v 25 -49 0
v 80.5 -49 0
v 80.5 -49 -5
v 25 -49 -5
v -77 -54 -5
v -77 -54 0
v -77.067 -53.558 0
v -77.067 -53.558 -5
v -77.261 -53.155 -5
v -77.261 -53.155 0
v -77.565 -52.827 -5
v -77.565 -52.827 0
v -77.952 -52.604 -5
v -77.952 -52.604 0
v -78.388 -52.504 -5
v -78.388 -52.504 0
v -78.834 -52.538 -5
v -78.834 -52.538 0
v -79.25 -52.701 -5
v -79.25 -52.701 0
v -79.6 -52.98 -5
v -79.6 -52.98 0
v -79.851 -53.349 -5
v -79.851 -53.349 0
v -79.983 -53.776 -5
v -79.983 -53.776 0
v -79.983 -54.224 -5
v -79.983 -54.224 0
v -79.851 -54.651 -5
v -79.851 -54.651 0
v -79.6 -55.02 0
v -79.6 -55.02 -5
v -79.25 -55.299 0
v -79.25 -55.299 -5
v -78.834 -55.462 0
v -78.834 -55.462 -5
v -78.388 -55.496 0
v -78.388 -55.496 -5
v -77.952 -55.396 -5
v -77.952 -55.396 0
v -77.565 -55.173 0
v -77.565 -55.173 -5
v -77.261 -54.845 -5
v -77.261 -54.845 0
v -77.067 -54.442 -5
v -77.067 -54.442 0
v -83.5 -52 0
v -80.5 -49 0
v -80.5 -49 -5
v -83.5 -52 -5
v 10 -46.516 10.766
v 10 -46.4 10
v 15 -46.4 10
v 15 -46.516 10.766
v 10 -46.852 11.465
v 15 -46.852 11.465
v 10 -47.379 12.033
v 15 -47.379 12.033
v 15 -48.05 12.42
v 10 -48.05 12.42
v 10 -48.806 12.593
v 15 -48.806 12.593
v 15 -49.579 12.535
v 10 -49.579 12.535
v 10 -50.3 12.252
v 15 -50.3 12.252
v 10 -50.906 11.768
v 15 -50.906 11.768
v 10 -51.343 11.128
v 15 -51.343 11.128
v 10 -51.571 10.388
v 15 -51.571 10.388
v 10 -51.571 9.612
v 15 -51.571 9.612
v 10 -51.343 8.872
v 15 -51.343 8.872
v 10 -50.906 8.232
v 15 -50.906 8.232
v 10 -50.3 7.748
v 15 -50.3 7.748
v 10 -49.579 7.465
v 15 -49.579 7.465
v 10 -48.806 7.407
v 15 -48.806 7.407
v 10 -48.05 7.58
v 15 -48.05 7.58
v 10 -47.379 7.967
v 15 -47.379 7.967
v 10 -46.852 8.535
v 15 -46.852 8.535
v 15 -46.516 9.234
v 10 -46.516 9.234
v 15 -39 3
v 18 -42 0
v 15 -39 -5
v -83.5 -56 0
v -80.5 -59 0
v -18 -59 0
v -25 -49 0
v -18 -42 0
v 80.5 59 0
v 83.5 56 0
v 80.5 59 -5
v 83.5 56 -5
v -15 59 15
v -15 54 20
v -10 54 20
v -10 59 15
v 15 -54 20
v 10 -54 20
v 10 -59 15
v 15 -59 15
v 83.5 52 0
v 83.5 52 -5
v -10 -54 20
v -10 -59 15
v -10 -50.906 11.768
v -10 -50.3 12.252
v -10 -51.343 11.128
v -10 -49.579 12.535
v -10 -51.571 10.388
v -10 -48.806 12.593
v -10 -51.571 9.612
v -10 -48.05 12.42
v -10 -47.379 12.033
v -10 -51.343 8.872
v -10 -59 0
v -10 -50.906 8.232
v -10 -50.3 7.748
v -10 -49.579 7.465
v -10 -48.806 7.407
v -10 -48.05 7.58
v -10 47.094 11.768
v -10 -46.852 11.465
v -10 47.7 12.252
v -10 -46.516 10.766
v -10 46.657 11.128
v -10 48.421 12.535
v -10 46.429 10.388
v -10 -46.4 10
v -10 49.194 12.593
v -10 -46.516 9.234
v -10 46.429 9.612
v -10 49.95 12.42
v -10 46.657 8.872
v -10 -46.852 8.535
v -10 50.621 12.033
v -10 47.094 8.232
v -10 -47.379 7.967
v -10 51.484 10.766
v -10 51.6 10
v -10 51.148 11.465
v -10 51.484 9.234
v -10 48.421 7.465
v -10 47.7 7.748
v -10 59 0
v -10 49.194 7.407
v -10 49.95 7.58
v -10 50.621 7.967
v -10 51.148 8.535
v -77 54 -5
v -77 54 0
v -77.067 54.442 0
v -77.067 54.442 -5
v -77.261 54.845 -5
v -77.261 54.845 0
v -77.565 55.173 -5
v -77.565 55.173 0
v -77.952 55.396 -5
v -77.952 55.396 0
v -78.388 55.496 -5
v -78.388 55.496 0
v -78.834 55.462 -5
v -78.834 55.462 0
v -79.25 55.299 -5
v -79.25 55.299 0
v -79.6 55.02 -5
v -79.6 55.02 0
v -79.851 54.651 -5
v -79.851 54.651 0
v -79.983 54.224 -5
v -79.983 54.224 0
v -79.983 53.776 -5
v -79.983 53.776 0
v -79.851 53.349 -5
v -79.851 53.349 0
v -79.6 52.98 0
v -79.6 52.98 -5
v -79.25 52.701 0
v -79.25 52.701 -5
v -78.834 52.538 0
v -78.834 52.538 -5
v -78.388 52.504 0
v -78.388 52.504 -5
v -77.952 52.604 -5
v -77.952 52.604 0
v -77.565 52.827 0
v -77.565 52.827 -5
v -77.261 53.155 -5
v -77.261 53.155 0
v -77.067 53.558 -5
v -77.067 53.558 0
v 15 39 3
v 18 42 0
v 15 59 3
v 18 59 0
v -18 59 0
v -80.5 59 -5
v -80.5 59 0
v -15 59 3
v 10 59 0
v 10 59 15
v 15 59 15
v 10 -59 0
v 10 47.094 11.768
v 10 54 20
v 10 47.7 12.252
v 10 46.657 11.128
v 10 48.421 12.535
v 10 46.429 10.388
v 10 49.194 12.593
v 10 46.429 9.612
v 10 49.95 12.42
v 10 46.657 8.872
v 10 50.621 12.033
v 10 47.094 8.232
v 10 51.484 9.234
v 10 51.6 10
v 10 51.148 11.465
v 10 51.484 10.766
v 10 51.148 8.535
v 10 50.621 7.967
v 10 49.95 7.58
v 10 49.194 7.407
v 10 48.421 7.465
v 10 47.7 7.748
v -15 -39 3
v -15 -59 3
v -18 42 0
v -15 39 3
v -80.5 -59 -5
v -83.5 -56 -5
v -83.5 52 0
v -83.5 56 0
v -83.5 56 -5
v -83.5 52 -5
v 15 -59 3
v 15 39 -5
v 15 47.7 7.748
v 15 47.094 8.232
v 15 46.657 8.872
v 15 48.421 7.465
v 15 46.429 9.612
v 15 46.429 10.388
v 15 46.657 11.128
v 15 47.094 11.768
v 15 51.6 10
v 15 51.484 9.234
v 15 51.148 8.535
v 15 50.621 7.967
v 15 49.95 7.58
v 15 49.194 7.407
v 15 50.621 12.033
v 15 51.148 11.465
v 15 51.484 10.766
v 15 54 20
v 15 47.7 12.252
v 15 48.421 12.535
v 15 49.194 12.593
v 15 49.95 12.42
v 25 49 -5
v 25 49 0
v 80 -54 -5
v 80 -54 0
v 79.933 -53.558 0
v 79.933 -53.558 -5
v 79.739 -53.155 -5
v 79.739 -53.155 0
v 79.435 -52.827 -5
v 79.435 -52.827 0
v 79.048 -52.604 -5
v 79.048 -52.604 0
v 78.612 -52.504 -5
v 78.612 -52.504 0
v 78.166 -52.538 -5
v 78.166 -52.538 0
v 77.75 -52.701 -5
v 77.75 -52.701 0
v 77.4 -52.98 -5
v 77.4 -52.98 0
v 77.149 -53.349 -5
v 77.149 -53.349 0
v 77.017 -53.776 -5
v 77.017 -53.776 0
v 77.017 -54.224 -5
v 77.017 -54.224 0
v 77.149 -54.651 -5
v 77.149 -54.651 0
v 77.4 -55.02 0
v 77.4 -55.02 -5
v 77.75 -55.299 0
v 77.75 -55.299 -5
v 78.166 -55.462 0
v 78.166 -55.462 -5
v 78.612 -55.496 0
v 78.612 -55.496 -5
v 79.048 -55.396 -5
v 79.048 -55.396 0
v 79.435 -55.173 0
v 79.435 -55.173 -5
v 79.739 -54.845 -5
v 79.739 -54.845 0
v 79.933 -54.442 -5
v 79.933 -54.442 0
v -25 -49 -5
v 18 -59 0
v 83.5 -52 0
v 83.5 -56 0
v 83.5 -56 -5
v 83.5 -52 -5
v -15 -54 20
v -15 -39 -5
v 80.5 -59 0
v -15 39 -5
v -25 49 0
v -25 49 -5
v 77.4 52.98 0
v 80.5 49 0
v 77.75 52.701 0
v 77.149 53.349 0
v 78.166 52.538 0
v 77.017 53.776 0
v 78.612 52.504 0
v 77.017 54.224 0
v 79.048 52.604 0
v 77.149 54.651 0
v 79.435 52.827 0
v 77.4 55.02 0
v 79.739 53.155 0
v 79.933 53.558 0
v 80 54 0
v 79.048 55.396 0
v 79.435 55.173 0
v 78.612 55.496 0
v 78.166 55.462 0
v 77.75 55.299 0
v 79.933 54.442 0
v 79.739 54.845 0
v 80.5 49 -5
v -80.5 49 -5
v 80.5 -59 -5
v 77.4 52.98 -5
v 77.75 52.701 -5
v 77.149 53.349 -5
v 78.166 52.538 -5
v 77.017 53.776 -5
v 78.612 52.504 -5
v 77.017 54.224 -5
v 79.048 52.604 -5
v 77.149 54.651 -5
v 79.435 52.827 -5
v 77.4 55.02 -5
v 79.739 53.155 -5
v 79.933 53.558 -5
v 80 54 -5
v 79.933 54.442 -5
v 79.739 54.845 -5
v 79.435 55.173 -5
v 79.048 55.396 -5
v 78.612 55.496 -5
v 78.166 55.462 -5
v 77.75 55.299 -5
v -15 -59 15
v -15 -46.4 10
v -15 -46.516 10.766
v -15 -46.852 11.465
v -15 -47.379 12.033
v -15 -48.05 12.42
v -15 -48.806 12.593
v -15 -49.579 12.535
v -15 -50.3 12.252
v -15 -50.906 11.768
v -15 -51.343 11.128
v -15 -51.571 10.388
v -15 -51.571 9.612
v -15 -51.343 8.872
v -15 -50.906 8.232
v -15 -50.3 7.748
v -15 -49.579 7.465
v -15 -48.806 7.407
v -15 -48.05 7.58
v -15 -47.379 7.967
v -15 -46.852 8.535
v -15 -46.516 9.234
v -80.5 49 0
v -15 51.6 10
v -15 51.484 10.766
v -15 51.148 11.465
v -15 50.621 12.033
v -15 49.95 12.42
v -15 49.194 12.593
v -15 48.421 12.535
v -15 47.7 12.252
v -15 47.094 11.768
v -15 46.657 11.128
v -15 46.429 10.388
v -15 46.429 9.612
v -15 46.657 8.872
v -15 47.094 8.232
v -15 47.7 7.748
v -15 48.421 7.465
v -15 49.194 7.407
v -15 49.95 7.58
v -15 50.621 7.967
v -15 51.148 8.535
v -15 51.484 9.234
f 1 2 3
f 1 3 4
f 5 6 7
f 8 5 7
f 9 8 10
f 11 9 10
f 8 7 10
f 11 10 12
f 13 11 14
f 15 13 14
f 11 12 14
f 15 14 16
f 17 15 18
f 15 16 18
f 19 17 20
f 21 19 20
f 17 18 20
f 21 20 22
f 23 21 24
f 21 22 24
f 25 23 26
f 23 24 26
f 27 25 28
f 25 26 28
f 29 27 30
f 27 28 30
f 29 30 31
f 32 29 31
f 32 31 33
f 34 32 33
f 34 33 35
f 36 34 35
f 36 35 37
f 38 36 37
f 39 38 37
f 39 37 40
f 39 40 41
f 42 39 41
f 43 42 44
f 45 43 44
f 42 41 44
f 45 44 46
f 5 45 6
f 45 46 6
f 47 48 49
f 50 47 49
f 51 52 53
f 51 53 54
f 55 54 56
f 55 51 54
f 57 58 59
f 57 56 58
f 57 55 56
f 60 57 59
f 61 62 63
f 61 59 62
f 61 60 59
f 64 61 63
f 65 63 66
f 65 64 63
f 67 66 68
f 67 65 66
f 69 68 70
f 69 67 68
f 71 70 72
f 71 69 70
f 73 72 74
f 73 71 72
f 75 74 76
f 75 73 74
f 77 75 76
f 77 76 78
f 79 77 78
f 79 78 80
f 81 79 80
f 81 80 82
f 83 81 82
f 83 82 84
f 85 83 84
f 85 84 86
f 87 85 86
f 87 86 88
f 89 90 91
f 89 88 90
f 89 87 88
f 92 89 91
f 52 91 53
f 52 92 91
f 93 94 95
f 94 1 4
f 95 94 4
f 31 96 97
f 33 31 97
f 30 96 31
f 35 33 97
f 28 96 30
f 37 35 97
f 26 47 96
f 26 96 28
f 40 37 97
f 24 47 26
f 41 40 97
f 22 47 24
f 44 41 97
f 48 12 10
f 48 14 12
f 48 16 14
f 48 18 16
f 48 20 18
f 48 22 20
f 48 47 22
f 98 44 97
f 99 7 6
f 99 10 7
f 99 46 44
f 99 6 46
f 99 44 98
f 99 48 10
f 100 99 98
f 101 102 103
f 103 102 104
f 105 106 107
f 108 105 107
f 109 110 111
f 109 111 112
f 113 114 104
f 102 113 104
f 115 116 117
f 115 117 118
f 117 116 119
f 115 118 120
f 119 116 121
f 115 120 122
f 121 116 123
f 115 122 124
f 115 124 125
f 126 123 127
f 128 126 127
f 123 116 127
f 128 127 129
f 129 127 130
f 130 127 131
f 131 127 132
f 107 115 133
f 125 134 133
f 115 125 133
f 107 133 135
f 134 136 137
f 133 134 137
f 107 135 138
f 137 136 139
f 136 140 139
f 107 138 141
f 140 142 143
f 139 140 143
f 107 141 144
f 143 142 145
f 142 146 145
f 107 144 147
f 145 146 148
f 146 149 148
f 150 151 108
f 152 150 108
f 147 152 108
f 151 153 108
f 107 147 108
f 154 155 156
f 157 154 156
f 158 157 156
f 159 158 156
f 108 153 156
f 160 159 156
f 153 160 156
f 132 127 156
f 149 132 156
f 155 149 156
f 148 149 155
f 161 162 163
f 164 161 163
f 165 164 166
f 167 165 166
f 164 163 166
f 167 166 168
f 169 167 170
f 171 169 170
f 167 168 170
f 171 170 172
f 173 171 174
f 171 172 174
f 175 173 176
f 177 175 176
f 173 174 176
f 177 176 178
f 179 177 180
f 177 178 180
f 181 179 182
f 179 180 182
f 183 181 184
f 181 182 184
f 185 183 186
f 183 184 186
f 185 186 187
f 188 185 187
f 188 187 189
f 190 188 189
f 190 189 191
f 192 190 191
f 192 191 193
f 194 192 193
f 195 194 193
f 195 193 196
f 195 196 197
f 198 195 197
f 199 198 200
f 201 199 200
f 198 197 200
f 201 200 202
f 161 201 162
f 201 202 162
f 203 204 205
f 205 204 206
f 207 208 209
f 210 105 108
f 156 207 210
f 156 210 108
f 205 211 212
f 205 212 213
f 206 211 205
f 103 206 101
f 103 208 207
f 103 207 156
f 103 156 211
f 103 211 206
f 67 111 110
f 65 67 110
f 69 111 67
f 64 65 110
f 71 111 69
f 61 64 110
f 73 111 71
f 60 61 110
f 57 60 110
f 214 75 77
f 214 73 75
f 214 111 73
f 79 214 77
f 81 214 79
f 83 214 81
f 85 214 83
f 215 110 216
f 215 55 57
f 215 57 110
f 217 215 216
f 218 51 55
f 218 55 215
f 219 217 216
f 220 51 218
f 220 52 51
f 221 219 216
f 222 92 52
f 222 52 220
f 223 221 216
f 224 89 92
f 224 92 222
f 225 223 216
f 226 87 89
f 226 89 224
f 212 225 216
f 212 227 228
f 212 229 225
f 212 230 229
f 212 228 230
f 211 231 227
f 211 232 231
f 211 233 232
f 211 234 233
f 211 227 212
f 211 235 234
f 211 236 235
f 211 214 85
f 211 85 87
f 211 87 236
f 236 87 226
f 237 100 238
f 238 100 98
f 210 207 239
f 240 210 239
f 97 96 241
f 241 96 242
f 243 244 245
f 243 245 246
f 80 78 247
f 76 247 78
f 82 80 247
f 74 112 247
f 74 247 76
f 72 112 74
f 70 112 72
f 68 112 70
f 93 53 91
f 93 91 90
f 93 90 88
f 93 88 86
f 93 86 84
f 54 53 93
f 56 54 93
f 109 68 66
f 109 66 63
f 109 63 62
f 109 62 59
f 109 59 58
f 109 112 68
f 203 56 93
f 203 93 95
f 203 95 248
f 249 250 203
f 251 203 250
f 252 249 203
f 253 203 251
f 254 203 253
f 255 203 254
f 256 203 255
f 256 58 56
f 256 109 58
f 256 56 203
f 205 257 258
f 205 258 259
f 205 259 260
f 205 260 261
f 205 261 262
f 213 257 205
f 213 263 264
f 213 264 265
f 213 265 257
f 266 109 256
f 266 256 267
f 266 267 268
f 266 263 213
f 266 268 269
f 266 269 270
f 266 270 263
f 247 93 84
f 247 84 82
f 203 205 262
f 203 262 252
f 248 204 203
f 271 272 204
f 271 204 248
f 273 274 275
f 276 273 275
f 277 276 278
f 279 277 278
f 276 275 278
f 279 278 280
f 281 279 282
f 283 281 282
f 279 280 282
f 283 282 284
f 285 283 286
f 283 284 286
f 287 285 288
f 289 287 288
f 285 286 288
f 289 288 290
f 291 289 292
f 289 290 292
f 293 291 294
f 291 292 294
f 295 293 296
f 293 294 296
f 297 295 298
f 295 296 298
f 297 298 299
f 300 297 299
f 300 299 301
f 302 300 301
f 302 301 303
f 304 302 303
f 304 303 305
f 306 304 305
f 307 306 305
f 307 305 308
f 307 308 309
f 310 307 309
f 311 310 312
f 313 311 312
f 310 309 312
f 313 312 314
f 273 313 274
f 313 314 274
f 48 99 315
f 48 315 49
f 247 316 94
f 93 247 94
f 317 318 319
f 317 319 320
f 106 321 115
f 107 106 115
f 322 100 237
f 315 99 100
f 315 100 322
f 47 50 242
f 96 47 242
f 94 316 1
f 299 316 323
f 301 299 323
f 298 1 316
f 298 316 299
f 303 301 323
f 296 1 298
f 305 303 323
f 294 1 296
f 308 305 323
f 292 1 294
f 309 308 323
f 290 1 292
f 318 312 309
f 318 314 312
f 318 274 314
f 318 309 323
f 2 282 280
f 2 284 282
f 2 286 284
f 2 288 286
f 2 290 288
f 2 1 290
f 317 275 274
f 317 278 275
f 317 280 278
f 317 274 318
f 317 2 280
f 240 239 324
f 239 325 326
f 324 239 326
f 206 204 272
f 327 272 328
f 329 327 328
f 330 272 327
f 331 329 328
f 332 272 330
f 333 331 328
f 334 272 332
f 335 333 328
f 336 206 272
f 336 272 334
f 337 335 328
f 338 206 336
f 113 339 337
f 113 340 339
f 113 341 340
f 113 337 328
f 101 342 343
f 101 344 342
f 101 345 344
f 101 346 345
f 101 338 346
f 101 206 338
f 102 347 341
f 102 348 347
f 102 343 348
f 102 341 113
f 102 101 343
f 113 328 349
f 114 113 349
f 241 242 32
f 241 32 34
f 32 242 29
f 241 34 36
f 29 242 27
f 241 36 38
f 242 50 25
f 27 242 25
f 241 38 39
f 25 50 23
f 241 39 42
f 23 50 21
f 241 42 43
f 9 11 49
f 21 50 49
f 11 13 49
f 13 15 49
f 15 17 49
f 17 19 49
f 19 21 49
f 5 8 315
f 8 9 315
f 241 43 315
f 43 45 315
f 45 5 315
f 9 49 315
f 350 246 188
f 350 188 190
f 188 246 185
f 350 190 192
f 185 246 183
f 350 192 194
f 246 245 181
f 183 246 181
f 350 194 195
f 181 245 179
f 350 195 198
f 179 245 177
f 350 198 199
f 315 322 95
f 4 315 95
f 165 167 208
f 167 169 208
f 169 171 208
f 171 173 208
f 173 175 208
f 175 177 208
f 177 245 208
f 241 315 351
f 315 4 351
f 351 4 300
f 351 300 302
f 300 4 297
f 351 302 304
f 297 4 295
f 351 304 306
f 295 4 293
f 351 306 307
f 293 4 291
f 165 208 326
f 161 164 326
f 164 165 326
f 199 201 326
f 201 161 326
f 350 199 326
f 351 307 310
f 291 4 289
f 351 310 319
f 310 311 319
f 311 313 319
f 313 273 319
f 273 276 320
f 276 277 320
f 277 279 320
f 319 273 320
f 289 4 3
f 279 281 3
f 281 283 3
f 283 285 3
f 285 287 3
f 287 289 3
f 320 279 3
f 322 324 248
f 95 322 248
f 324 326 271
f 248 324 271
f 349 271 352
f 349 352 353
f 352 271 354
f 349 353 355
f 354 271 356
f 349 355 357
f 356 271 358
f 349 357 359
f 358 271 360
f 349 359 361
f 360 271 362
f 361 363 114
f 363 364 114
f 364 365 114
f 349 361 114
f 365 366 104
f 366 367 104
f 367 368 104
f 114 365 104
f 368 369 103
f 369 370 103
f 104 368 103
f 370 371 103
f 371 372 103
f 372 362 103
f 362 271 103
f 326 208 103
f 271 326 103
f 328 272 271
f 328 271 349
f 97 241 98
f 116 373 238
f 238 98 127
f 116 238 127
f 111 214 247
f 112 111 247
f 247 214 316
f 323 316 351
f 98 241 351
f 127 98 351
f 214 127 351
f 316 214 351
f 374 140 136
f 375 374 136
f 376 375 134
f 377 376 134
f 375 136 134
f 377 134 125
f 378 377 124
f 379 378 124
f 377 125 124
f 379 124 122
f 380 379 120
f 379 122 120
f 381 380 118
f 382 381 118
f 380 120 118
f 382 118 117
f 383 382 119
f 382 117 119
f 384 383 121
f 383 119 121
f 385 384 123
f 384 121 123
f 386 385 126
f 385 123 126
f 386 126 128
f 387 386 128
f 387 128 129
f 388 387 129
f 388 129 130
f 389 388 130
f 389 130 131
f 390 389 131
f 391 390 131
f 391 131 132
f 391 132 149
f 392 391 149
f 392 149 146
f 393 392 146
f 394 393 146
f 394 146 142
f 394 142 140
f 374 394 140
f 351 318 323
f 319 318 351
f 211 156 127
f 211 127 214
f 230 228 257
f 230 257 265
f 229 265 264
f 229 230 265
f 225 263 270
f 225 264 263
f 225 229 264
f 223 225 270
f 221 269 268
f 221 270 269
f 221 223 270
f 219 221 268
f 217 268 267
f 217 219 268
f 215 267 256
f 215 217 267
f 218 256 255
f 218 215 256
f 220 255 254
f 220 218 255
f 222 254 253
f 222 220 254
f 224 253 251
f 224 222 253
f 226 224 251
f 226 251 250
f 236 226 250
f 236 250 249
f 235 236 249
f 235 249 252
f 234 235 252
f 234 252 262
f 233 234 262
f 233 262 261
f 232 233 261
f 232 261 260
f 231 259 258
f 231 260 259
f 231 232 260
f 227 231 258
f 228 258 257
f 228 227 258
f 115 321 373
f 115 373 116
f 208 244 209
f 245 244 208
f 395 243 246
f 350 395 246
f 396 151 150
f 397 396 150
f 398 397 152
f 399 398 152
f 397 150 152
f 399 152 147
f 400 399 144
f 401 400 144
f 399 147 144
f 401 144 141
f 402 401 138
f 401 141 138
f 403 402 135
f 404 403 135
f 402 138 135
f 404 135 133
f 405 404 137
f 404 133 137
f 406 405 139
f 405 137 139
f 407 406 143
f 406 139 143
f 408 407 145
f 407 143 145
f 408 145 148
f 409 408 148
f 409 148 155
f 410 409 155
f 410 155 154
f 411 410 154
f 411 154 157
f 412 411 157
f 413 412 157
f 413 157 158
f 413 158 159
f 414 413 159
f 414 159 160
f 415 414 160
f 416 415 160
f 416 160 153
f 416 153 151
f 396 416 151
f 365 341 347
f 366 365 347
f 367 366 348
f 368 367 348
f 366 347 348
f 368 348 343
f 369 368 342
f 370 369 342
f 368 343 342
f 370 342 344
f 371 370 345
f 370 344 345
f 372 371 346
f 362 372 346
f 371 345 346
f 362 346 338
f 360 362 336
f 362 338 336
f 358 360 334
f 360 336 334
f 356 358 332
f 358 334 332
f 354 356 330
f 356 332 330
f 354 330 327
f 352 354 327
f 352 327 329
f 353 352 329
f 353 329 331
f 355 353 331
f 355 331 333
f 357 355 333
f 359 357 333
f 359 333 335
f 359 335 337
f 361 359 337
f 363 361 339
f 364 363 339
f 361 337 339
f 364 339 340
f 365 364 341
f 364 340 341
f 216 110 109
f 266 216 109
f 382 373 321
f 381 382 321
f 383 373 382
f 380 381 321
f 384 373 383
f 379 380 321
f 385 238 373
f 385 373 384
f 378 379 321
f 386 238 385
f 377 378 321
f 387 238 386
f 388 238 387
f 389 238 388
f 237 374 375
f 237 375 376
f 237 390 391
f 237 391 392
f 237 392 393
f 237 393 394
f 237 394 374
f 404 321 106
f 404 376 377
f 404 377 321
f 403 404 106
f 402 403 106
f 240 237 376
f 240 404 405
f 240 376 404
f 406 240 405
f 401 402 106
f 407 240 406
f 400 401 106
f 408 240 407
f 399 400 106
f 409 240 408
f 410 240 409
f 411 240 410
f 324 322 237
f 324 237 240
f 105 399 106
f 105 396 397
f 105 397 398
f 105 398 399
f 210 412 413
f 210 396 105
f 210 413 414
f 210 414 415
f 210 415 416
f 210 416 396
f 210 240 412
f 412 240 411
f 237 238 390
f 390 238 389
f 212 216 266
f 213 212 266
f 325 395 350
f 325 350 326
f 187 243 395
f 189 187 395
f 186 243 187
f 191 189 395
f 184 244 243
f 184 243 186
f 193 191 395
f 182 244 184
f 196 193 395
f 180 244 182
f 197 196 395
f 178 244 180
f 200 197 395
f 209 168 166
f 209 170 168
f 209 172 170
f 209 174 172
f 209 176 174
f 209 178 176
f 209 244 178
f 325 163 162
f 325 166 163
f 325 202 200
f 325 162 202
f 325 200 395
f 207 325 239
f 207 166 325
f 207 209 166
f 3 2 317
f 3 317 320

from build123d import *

# Parameters (mm, degrees)
SKETCH_R          = 1.5
PAD_DEPTH         = 5
SKETCH001_W       = 5
SKETCH001_H       = 118
PAD001_DEPTH      = 20
CHAMFER_SIZE      = 3
CHAMFER001_SIZE   = 5
CHAMFER002_SIZE   = 10
CHAMFER003_SIZE   = 3
SKETCH002_R       = 2.6
POCKET_DEPTH      = 17
POCKET_DEPTH_BACK = -100


with BuildPart() as part:
    # Sketch → Pad (new body)
    with BuildSketch(Plane.XY):
        Polygon((-83.5, 59), (-83.5, 49), (-15, 49), (-15, -49), (-83.5, -49), (-83.5, -59), (83.5, -59), (83.5, -49), (15, -49), (15, 49), (83.5, 49), (83.5, 59), align=None)
        with Locations((-78.5, 54)):
            Circle(SKETCH_R, mode=Mode.SUBTRACT)
        with Locations((78.5, 54)):
            Circle(SKETCH_R, mode=Mode.SUBTRACT)
        with Locations((78.5, -54)):
            Circle(SKETCH_R, mode=Mode.SUBTRACT)
        with Locations((-78.5, -54)):
            Circle(SKETCH_R, mode=Mode.SUBTRACT)
    extrude(amount=-PAD_DEPTH)

    # Sketch001 → Pad001 (join)
    with BuildSketch(Plane.XY):
        with Locations((-12.5, 0)):
            Rectangle(SKETCH001_W, SKETCH001_H)
        with Locations((12.5, 0)):
            Rectangle(SKETCH001_W, SKETCH001_H)
    extrude(amount=PAD001_DEPTH)

    # Chamfer
    chamfer_edges = [part.edges().sort_by_distance(p)[0] for p in [
        (-83.5, 49, -2.5),
        (-83.5, 59, -2.5),
        (-83.5, -49, -2.5),
        (-83.5, -59, -2.5),
        (83.5, -59, -2.5),
        (83.5, 49, -2.5),
        (83.5, 59, -2.5),
        (83.5, -49, -2.5),
    ]]
    chamfer(chamfer_edges, length=CHAMFER_SIZE)

    # Chamfer001
    chamfer001_edges = [part.edges().sort_by_distance(p)[0] for p in [
        (-12.5, -59, 20),
        (12.5, -59, 20),
        (12.5, 59, 20),
        (-12.5, 59, 20),
    ]]
    chamfer(chamfer001_edges, length=CHAMFER001_SIZE)

    # Chamfer002
    chamfer002_edges = [part.edges().sort_by_distance(p)[0] for p in [
        (-15, 49, -2.5),
        (-15, -49, -2.5),
        (15, -49, -2.5),
        (15, 49, -2.5),
    ]]
    chamfer(chamfer002_edges, length=CHAMFER002_SIZE)

    # Chamfer003
    chamfer003_edges = [part.edges().sort_by_distance(p)[0] for p in [
        (-15, 54, 0),
        (-15, -54, 0),
        (15, -54, 0),
        (15, 54, 0),
    ]]
    chamfer(chamfer003_edges, length=CHAMFER003_SIZE)

    # Sketch002 → Pocket (cut, two sides)
    with BuildSketch(Plane.YZ) as pocket_sk:
        with Locations((-49, 10)):
            Circle(SKETCH002_R)
        with Locations((49, 10)):
            Circle(SKETCH002_R)
    extrude(amount=-POCKET_DEPTH, mode=Mode.SUBTRACT)
    extrude(pocket_sk.sketch, amount=-POCKET_DEPTH_BACK, mode=Mode.SUBTRACT)


solid = part.part
